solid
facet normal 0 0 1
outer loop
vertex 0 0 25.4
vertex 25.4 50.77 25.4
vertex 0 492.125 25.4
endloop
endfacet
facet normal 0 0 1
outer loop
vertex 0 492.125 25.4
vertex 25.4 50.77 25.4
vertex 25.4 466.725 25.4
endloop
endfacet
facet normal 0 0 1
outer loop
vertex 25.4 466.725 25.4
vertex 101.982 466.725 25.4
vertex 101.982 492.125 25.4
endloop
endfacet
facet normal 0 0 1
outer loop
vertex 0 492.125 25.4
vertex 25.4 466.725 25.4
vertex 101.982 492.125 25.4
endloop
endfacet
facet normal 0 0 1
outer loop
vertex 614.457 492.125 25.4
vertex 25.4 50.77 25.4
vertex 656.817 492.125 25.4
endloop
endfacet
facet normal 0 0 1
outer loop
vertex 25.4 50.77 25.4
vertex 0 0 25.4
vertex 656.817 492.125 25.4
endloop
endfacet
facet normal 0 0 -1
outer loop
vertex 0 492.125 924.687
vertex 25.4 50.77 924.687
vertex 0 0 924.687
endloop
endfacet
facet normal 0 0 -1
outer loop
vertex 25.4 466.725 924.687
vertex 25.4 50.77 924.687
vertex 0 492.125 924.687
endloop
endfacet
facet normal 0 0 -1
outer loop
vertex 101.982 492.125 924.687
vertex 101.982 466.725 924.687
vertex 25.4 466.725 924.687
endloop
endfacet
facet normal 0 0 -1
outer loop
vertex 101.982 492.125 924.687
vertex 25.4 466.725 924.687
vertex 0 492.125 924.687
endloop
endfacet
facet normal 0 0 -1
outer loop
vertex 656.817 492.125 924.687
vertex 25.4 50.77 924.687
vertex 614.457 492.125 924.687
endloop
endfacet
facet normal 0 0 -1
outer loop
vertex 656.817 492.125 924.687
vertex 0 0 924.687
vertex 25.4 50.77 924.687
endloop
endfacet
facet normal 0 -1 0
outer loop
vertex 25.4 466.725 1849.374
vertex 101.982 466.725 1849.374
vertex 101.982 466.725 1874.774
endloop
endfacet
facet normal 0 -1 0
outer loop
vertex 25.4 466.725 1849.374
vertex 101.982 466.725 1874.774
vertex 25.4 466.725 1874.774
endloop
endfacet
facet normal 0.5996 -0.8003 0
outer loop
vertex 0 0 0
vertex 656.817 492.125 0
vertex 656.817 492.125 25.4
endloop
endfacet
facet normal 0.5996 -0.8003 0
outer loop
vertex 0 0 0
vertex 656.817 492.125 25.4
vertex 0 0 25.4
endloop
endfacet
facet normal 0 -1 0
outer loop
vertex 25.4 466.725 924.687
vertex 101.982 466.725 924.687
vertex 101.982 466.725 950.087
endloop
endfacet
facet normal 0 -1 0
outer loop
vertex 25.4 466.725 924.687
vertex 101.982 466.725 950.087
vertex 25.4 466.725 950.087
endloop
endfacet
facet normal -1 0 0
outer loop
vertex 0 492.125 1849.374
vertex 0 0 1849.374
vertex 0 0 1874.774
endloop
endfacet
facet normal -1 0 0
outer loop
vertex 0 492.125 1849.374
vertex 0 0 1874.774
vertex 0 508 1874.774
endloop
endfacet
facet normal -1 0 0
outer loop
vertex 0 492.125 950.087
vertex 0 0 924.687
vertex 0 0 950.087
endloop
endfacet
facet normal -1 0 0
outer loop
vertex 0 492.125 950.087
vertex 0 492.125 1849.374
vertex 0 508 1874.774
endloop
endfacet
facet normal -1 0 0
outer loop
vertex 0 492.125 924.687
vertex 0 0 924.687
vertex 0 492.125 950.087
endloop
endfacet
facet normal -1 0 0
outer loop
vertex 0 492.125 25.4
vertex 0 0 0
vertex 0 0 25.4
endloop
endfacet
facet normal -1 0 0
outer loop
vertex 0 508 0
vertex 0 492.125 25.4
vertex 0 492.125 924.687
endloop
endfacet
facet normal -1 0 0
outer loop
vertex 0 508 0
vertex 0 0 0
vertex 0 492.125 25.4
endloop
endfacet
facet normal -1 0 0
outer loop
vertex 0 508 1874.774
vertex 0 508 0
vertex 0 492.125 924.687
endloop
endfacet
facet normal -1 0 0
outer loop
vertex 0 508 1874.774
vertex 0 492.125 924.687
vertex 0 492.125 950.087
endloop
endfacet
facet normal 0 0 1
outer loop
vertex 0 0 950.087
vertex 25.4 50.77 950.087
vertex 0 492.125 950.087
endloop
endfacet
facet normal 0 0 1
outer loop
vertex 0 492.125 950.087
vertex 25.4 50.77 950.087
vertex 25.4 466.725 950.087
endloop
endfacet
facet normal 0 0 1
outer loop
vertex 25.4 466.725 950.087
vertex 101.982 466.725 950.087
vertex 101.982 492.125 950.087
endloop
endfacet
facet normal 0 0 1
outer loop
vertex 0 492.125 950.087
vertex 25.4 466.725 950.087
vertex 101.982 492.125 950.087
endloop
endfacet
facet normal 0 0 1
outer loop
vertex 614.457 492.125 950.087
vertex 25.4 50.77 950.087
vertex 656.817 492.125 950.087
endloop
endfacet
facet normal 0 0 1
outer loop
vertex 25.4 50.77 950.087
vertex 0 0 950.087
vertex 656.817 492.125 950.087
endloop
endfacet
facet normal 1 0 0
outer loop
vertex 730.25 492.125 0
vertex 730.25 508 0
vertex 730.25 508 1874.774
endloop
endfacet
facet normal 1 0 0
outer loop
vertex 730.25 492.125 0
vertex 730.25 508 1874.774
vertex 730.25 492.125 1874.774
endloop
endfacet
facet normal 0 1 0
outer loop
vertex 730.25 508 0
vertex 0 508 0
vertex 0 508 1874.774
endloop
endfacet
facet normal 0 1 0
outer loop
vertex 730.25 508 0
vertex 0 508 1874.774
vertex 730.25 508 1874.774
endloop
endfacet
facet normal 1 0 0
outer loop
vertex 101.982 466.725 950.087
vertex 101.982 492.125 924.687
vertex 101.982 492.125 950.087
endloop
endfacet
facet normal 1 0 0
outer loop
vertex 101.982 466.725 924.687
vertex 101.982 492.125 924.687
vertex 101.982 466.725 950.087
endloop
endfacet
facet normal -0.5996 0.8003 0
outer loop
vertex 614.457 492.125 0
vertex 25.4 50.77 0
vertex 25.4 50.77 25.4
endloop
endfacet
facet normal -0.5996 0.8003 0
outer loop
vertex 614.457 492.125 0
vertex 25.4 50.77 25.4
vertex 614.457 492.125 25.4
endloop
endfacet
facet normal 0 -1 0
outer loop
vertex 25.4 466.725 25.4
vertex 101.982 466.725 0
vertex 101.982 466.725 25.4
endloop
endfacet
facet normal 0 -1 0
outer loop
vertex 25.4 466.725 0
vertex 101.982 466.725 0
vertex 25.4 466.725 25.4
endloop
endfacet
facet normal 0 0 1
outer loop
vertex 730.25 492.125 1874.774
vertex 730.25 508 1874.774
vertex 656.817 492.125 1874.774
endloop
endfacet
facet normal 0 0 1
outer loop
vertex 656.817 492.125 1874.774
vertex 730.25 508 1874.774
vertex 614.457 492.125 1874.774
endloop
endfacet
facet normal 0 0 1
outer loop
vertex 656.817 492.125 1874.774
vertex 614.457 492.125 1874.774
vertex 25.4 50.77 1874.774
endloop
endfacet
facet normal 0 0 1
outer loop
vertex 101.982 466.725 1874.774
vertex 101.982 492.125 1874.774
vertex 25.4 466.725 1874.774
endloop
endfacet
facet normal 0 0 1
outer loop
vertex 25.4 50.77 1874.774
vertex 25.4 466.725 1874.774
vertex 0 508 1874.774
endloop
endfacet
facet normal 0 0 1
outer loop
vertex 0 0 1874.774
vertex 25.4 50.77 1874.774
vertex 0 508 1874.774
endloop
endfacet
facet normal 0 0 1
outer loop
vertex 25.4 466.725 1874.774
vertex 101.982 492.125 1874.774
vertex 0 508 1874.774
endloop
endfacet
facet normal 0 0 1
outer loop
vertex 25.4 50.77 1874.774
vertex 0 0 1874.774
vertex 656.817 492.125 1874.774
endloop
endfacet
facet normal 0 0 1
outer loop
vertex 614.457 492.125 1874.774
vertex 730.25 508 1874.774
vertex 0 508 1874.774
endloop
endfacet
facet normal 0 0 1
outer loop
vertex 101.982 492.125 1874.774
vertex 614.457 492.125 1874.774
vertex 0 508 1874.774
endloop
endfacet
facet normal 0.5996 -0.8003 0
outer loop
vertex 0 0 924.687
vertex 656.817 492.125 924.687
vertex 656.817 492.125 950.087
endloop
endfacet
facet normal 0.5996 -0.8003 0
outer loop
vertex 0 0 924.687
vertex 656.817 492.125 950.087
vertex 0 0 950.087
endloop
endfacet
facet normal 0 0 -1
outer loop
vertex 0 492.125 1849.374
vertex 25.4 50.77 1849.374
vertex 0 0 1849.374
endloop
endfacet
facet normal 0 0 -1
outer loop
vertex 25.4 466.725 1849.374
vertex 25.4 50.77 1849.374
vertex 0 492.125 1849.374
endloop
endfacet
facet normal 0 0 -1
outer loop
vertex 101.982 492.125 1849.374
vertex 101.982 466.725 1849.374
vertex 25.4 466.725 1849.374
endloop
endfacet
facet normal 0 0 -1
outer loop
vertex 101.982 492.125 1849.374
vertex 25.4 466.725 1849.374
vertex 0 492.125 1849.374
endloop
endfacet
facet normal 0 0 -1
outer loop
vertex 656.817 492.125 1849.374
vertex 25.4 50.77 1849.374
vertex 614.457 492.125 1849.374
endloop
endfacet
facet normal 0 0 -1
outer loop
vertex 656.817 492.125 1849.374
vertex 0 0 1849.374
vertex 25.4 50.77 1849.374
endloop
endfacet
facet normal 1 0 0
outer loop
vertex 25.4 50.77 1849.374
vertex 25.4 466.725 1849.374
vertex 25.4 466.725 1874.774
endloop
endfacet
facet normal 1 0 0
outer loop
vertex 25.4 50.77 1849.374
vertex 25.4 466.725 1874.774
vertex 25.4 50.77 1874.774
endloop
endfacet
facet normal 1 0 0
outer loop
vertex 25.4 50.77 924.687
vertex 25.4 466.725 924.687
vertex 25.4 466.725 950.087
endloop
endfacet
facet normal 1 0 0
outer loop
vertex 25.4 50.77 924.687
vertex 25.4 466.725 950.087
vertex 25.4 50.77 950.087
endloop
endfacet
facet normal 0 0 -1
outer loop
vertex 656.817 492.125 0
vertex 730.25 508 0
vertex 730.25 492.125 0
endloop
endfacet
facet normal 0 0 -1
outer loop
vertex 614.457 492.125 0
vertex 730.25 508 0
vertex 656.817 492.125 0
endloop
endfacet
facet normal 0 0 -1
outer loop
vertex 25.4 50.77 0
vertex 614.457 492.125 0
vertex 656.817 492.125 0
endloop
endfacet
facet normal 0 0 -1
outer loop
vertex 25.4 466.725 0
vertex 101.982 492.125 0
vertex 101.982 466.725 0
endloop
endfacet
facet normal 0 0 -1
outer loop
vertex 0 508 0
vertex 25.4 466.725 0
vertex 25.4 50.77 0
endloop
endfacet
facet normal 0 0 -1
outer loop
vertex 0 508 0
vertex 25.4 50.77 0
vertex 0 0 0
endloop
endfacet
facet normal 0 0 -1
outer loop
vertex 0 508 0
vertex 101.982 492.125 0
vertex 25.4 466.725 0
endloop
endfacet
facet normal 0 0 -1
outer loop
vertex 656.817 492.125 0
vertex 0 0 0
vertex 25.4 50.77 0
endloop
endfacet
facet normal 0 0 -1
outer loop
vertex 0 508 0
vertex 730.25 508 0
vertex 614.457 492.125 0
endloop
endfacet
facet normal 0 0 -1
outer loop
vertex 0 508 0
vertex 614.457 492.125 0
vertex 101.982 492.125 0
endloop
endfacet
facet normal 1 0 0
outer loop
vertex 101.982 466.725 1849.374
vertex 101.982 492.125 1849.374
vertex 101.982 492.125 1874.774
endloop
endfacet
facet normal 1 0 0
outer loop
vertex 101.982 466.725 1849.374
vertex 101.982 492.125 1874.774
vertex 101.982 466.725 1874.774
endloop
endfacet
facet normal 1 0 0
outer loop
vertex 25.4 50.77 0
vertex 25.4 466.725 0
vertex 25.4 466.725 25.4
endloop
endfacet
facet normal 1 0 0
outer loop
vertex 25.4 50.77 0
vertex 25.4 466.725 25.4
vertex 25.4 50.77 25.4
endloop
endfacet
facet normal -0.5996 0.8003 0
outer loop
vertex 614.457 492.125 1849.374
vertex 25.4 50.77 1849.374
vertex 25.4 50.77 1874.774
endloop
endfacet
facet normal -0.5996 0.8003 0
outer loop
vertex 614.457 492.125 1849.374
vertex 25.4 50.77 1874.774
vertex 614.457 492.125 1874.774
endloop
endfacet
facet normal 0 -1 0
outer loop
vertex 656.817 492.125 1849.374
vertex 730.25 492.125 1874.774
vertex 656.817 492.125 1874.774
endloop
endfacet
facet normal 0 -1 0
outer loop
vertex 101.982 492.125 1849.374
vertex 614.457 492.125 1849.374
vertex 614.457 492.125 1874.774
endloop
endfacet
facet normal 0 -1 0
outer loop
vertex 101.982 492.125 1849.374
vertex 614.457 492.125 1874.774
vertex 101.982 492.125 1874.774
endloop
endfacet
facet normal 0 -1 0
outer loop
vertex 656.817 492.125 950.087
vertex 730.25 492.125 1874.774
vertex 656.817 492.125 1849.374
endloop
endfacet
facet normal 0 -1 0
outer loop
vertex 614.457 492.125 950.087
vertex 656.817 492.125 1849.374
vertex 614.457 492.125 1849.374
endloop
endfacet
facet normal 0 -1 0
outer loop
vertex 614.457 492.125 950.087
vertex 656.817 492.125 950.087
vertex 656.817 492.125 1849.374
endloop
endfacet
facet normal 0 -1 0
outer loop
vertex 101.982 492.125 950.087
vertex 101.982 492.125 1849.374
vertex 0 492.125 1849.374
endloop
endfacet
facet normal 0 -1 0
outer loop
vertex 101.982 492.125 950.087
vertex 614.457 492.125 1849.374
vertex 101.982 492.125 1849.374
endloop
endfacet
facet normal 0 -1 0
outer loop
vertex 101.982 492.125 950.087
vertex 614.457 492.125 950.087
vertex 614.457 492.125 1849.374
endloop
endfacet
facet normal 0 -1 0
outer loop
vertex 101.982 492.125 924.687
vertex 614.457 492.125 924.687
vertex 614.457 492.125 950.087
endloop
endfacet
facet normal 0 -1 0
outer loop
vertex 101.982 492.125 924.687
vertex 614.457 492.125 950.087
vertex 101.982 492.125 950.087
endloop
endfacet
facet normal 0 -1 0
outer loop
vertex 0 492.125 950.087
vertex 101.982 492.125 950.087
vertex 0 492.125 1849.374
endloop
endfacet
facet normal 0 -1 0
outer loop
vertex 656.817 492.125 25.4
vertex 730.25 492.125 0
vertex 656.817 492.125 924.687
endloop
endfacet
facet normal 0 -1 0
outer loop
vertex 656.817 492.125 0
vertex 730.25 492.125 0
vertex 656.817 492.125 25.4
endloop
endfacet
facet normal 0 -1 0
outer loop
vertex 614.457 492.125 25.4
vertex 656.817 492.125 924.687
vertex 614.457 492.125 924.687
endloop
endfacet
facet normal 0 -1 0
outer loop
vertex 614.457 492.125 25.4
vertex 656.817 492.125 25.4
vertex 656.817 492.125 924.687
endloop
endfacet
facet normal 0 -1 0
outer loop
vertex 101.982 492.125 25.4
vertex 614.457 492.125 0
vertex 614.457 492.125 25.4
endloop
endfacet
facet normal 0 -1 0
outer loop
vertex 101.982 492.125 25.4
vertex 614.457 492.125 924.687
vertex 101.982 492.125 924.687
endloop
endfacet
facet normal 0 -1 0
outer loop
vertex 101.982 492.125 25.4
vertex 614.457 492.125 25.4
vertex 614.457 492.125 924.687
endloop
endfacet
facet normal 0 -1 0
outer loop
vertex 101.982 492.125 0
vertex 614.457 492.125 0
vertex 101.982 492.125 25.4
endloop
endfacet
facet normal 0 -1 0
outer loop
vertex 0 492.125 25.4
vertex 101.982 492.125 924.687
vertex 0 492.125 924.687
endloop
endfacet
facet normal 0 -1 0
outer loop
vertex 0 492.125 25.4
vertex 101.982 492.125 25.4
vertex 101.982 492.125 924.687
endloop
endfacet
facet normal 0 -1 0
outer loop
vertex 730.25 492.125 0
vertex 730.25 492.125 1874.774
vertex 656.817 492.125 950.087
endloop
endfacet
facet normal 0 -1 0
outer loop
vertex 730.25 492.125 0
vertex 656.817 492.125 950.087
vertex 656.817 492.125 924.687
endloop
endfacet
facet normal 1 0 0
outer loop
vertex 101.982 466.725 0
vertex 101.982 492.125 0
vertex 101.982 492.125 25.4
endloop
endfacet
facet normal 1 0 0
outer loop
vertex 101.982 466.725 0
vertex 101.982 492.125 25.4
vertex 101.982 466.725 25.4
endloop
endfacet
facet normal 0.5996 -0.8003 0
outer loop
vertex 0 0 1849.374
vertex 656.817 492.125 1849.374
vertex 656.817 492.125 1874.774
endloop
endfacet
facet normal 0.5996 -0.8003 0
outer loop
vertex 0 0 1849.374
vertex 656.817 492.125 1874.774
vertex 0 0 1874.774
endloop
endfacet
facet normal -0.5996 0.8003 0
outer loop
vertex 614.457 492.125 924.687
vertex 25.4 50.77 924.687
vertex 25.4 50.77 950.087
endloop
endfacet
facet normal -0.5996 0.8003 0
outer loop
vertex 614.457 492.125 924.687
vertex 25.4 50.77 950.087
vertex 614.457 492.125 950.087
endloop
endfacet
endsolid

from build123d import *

# Parameters (mm, degrees)
BOSS_EXTRUDE1_DEPTH = 1874.774
SKETCH2_W           = 899.287
SKETCH2_H           = 492.125
CUT_EXTRUDE1_DEPTH  = 731.25


with BuildPart() as part:
    # Sketch1 → Boss-Extrude1 (new body)
    with BuildSketch(Plane.XY):
        Polygon((730.25, 492.125), (656.817236389, 492.125), (0, 0), (0, 508), (730.25, 508), align=None)
        Polygon((101.981819436, 492.125), (101.981819436, 466.725), (25.4, 466.725), (25.4, 50.769813509), (614.457036031, 492.125), align=None, mode=Mode.SUBTRACT)
    extrude(amount=BOSS_EXTRUDE1_DEPTH)

    # Sketch2 → Cut-Extrude1 (cut, through all)
    with BuildSketch(Plane(origin=(730.25, 0, 0), x_dir=(0, 0, -1), z_dir=(1, 0, 0))):
        with Locations((-1399.7305, 246.0625)):
            Rectangle(SKETCH2_W, SKETCH2_H)
        with Locations((-475.0435, 246.0625)):
            Rectangle(SKETCH2_W, SKETCH2_H)
    extrude(amount=-CUT_EXTRUDE1_DEPTH, mode=Mode.SUBTRACT)


solid = part.part
